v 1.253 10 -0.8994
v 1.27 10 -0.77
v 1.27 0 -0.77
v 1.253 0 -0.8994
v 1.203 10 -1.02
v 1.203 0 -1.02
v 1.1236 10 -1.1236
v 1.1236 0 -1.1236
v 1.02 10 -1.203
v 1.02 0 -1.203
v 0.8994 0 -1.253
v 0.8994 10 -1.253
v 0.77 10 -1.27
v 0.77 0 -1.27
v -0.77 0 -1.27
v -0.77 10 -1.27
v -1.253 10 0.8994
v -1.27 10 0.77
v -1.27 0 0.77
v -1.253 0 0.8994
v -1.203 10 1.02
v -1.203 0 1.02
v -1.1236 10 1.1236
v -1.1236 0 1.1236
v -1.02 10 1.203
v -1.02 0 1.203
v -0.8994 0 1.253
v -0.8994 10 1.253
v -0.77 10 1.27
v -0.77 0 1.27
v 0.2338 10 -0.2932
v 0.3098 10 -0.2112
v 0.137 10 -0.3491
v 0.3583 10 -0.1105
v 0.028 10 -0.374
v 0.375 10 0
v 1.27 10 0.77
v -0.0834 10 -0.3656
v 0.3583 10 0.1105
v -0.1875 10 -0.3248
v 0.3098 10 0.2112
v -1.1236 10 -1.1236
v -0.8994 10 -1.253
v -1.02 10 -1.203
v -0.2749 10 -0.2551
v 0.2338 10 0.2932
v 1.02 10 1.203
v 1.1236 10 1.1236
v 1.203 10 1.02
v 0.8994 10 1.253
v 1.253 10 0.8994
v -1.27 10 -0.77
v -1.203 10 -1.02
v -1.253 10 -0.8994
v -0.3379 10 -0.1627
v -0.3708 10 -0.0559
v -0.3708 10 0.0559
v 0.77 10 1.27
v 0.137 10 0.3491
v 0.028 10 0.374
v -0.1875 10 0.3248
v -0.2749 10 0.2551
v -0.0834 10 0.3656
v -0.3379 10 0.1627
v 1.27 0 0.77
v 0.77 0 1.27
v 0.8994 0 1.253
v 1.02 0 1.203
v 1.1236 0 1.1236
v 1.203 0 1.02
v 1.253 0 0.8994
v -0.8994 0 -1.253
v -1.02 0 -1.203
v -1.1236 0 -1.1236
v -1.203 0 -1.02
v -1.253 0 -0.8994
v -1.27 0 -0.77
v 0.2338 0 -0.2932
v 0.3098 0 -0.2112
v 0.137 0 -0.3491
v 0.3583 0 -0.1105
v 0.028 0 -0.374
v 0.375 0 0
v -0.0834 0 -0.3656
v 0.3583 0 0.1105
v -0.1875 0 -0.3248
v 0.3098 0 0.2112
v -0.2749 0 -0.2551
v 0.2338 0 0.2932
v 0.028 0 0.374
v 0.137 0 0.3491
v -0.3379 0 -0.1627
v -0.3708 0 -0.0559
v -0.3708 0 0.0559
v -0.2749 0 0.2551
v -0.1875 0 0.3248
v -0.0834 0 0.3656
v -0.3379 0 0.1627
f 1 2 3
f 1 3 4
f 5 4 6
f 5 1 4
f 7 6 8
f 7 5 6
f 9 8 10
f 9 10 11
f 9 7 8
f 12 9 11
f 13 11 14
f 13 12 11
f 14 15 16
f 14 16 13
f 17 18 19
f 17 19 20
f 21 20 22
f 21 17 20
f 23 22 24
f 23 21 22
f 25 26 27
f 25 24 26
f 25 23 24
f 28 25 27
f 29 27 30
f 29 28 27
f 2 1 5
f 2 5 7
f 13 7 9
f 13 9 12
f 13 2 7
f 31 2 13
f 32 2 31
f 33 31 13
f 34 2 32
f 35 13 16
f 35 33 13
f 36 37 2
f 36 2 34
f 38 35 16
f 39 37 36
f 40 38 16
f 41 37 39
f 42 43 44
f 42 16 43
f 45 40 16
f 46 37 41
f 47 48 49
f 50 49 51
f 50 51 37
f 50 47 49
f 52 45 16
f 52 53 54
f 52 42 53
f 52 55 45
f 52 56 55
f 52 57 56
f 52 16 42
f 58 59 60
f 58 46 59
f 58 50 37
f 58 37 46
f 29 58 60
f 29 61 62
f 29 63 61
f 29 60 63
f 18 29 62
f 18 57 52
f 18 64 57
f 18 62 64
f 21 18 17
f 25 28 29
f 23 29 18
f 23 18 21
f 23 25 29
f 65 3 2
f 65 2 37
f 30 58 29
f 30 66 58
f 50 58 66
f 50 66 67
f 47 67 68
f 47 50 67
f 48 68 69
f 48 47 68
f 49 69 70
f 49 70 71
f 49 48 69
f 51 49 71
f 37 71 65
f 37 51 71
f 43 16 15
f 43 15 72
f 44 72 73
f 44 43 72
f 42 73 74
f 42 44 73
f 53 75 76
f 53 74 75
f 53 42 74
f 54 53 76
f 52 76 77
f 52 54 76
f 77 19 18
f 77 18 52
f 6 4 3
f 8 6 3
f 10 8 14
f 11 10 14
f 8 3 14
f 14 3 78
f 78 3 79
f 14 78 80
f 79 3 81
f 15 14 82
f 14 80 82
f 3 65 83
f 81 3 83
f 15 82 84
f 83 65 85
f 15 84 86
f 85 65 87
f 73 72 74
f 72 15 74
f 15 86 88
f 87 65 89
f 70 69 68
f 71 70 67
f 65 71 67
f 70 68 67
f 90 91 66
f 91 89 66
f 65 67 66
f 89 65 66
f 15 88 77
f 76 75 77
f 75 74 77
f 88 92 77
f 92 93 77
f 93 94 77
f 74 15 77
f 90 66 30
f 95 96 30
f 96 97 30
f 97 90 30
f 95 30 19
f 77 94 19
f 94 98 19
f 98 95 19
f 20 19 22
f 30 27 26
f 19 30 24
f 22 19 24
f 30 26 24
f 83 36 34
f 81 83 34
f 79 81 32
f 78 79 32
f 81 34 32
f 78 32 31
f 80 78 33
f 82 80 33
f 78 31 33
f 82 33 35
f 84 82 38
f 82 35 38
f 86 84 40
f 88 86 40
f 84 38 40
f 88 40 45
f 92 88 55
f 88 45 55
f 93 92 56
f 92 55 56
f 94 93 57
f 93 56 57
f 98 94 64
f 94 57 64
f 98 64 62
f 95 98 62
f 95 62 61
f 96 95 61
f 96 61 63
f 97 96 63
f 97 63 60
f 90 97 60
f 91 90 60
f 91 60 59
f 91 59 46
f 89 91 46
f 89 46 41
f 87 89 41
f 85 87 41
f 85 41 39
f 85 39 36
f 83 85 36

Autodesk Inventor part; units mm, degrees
ref_plane "YZ Plane" through (0, 0, 0) normal (1, 0, 0) x (0, 1, 0)
ref_plane "XZ Plane" through (0, 0, 0) normal (0, 1, 0) x (-1, 0, 0)
ref_plane "XY Plane" through (0, 0, 0) normal (0, 0, 1) x (1, 0, 0)
sketch "Sketch1" plane through (0, 0, 0) normal (0, 1, 0) x (-1, 0, 0)
  line L0 (-1.27, 1.27) -> (1.27, 1.27)
  line L1 (1.27, 1.27) -> (1.27, -1.27)
  line L2 (1.27, -1.27) -> (-1.27, -1.27)
  line L3 (-1.27, -1.27) -> (-1.27, 1.27)
  line L4 (-1.27, 1.27) -> (1.27, -1.27) construction
  line L5 (1.27, 1.27) -> (-1.27, -1.27) construction
  point P0 (0, 0)
  dimension "d0" = 2.54
  dimension "d1" = 2.54
extrude "Extrusion1" add sketch "Sketch1" along normal blind 10
sketch "Sketch2" plane through (0, 10, 0) normal (0, 1, 0) x (1, 0, 0)
  circle A0 centre (0, 0) radius 0.375
  dimension "d4" = 0.75
extrude "Extrusion2" cut sketch "Sketch2" against normal blind 100
fillet "Fillet1" radius 0.5 4 edges at (-1.27, 5, 1.27) (1.27, 5, 1.27) (1.27, 5, -1.27) (-1.27, 5, -1.27)
properties part number "block"
